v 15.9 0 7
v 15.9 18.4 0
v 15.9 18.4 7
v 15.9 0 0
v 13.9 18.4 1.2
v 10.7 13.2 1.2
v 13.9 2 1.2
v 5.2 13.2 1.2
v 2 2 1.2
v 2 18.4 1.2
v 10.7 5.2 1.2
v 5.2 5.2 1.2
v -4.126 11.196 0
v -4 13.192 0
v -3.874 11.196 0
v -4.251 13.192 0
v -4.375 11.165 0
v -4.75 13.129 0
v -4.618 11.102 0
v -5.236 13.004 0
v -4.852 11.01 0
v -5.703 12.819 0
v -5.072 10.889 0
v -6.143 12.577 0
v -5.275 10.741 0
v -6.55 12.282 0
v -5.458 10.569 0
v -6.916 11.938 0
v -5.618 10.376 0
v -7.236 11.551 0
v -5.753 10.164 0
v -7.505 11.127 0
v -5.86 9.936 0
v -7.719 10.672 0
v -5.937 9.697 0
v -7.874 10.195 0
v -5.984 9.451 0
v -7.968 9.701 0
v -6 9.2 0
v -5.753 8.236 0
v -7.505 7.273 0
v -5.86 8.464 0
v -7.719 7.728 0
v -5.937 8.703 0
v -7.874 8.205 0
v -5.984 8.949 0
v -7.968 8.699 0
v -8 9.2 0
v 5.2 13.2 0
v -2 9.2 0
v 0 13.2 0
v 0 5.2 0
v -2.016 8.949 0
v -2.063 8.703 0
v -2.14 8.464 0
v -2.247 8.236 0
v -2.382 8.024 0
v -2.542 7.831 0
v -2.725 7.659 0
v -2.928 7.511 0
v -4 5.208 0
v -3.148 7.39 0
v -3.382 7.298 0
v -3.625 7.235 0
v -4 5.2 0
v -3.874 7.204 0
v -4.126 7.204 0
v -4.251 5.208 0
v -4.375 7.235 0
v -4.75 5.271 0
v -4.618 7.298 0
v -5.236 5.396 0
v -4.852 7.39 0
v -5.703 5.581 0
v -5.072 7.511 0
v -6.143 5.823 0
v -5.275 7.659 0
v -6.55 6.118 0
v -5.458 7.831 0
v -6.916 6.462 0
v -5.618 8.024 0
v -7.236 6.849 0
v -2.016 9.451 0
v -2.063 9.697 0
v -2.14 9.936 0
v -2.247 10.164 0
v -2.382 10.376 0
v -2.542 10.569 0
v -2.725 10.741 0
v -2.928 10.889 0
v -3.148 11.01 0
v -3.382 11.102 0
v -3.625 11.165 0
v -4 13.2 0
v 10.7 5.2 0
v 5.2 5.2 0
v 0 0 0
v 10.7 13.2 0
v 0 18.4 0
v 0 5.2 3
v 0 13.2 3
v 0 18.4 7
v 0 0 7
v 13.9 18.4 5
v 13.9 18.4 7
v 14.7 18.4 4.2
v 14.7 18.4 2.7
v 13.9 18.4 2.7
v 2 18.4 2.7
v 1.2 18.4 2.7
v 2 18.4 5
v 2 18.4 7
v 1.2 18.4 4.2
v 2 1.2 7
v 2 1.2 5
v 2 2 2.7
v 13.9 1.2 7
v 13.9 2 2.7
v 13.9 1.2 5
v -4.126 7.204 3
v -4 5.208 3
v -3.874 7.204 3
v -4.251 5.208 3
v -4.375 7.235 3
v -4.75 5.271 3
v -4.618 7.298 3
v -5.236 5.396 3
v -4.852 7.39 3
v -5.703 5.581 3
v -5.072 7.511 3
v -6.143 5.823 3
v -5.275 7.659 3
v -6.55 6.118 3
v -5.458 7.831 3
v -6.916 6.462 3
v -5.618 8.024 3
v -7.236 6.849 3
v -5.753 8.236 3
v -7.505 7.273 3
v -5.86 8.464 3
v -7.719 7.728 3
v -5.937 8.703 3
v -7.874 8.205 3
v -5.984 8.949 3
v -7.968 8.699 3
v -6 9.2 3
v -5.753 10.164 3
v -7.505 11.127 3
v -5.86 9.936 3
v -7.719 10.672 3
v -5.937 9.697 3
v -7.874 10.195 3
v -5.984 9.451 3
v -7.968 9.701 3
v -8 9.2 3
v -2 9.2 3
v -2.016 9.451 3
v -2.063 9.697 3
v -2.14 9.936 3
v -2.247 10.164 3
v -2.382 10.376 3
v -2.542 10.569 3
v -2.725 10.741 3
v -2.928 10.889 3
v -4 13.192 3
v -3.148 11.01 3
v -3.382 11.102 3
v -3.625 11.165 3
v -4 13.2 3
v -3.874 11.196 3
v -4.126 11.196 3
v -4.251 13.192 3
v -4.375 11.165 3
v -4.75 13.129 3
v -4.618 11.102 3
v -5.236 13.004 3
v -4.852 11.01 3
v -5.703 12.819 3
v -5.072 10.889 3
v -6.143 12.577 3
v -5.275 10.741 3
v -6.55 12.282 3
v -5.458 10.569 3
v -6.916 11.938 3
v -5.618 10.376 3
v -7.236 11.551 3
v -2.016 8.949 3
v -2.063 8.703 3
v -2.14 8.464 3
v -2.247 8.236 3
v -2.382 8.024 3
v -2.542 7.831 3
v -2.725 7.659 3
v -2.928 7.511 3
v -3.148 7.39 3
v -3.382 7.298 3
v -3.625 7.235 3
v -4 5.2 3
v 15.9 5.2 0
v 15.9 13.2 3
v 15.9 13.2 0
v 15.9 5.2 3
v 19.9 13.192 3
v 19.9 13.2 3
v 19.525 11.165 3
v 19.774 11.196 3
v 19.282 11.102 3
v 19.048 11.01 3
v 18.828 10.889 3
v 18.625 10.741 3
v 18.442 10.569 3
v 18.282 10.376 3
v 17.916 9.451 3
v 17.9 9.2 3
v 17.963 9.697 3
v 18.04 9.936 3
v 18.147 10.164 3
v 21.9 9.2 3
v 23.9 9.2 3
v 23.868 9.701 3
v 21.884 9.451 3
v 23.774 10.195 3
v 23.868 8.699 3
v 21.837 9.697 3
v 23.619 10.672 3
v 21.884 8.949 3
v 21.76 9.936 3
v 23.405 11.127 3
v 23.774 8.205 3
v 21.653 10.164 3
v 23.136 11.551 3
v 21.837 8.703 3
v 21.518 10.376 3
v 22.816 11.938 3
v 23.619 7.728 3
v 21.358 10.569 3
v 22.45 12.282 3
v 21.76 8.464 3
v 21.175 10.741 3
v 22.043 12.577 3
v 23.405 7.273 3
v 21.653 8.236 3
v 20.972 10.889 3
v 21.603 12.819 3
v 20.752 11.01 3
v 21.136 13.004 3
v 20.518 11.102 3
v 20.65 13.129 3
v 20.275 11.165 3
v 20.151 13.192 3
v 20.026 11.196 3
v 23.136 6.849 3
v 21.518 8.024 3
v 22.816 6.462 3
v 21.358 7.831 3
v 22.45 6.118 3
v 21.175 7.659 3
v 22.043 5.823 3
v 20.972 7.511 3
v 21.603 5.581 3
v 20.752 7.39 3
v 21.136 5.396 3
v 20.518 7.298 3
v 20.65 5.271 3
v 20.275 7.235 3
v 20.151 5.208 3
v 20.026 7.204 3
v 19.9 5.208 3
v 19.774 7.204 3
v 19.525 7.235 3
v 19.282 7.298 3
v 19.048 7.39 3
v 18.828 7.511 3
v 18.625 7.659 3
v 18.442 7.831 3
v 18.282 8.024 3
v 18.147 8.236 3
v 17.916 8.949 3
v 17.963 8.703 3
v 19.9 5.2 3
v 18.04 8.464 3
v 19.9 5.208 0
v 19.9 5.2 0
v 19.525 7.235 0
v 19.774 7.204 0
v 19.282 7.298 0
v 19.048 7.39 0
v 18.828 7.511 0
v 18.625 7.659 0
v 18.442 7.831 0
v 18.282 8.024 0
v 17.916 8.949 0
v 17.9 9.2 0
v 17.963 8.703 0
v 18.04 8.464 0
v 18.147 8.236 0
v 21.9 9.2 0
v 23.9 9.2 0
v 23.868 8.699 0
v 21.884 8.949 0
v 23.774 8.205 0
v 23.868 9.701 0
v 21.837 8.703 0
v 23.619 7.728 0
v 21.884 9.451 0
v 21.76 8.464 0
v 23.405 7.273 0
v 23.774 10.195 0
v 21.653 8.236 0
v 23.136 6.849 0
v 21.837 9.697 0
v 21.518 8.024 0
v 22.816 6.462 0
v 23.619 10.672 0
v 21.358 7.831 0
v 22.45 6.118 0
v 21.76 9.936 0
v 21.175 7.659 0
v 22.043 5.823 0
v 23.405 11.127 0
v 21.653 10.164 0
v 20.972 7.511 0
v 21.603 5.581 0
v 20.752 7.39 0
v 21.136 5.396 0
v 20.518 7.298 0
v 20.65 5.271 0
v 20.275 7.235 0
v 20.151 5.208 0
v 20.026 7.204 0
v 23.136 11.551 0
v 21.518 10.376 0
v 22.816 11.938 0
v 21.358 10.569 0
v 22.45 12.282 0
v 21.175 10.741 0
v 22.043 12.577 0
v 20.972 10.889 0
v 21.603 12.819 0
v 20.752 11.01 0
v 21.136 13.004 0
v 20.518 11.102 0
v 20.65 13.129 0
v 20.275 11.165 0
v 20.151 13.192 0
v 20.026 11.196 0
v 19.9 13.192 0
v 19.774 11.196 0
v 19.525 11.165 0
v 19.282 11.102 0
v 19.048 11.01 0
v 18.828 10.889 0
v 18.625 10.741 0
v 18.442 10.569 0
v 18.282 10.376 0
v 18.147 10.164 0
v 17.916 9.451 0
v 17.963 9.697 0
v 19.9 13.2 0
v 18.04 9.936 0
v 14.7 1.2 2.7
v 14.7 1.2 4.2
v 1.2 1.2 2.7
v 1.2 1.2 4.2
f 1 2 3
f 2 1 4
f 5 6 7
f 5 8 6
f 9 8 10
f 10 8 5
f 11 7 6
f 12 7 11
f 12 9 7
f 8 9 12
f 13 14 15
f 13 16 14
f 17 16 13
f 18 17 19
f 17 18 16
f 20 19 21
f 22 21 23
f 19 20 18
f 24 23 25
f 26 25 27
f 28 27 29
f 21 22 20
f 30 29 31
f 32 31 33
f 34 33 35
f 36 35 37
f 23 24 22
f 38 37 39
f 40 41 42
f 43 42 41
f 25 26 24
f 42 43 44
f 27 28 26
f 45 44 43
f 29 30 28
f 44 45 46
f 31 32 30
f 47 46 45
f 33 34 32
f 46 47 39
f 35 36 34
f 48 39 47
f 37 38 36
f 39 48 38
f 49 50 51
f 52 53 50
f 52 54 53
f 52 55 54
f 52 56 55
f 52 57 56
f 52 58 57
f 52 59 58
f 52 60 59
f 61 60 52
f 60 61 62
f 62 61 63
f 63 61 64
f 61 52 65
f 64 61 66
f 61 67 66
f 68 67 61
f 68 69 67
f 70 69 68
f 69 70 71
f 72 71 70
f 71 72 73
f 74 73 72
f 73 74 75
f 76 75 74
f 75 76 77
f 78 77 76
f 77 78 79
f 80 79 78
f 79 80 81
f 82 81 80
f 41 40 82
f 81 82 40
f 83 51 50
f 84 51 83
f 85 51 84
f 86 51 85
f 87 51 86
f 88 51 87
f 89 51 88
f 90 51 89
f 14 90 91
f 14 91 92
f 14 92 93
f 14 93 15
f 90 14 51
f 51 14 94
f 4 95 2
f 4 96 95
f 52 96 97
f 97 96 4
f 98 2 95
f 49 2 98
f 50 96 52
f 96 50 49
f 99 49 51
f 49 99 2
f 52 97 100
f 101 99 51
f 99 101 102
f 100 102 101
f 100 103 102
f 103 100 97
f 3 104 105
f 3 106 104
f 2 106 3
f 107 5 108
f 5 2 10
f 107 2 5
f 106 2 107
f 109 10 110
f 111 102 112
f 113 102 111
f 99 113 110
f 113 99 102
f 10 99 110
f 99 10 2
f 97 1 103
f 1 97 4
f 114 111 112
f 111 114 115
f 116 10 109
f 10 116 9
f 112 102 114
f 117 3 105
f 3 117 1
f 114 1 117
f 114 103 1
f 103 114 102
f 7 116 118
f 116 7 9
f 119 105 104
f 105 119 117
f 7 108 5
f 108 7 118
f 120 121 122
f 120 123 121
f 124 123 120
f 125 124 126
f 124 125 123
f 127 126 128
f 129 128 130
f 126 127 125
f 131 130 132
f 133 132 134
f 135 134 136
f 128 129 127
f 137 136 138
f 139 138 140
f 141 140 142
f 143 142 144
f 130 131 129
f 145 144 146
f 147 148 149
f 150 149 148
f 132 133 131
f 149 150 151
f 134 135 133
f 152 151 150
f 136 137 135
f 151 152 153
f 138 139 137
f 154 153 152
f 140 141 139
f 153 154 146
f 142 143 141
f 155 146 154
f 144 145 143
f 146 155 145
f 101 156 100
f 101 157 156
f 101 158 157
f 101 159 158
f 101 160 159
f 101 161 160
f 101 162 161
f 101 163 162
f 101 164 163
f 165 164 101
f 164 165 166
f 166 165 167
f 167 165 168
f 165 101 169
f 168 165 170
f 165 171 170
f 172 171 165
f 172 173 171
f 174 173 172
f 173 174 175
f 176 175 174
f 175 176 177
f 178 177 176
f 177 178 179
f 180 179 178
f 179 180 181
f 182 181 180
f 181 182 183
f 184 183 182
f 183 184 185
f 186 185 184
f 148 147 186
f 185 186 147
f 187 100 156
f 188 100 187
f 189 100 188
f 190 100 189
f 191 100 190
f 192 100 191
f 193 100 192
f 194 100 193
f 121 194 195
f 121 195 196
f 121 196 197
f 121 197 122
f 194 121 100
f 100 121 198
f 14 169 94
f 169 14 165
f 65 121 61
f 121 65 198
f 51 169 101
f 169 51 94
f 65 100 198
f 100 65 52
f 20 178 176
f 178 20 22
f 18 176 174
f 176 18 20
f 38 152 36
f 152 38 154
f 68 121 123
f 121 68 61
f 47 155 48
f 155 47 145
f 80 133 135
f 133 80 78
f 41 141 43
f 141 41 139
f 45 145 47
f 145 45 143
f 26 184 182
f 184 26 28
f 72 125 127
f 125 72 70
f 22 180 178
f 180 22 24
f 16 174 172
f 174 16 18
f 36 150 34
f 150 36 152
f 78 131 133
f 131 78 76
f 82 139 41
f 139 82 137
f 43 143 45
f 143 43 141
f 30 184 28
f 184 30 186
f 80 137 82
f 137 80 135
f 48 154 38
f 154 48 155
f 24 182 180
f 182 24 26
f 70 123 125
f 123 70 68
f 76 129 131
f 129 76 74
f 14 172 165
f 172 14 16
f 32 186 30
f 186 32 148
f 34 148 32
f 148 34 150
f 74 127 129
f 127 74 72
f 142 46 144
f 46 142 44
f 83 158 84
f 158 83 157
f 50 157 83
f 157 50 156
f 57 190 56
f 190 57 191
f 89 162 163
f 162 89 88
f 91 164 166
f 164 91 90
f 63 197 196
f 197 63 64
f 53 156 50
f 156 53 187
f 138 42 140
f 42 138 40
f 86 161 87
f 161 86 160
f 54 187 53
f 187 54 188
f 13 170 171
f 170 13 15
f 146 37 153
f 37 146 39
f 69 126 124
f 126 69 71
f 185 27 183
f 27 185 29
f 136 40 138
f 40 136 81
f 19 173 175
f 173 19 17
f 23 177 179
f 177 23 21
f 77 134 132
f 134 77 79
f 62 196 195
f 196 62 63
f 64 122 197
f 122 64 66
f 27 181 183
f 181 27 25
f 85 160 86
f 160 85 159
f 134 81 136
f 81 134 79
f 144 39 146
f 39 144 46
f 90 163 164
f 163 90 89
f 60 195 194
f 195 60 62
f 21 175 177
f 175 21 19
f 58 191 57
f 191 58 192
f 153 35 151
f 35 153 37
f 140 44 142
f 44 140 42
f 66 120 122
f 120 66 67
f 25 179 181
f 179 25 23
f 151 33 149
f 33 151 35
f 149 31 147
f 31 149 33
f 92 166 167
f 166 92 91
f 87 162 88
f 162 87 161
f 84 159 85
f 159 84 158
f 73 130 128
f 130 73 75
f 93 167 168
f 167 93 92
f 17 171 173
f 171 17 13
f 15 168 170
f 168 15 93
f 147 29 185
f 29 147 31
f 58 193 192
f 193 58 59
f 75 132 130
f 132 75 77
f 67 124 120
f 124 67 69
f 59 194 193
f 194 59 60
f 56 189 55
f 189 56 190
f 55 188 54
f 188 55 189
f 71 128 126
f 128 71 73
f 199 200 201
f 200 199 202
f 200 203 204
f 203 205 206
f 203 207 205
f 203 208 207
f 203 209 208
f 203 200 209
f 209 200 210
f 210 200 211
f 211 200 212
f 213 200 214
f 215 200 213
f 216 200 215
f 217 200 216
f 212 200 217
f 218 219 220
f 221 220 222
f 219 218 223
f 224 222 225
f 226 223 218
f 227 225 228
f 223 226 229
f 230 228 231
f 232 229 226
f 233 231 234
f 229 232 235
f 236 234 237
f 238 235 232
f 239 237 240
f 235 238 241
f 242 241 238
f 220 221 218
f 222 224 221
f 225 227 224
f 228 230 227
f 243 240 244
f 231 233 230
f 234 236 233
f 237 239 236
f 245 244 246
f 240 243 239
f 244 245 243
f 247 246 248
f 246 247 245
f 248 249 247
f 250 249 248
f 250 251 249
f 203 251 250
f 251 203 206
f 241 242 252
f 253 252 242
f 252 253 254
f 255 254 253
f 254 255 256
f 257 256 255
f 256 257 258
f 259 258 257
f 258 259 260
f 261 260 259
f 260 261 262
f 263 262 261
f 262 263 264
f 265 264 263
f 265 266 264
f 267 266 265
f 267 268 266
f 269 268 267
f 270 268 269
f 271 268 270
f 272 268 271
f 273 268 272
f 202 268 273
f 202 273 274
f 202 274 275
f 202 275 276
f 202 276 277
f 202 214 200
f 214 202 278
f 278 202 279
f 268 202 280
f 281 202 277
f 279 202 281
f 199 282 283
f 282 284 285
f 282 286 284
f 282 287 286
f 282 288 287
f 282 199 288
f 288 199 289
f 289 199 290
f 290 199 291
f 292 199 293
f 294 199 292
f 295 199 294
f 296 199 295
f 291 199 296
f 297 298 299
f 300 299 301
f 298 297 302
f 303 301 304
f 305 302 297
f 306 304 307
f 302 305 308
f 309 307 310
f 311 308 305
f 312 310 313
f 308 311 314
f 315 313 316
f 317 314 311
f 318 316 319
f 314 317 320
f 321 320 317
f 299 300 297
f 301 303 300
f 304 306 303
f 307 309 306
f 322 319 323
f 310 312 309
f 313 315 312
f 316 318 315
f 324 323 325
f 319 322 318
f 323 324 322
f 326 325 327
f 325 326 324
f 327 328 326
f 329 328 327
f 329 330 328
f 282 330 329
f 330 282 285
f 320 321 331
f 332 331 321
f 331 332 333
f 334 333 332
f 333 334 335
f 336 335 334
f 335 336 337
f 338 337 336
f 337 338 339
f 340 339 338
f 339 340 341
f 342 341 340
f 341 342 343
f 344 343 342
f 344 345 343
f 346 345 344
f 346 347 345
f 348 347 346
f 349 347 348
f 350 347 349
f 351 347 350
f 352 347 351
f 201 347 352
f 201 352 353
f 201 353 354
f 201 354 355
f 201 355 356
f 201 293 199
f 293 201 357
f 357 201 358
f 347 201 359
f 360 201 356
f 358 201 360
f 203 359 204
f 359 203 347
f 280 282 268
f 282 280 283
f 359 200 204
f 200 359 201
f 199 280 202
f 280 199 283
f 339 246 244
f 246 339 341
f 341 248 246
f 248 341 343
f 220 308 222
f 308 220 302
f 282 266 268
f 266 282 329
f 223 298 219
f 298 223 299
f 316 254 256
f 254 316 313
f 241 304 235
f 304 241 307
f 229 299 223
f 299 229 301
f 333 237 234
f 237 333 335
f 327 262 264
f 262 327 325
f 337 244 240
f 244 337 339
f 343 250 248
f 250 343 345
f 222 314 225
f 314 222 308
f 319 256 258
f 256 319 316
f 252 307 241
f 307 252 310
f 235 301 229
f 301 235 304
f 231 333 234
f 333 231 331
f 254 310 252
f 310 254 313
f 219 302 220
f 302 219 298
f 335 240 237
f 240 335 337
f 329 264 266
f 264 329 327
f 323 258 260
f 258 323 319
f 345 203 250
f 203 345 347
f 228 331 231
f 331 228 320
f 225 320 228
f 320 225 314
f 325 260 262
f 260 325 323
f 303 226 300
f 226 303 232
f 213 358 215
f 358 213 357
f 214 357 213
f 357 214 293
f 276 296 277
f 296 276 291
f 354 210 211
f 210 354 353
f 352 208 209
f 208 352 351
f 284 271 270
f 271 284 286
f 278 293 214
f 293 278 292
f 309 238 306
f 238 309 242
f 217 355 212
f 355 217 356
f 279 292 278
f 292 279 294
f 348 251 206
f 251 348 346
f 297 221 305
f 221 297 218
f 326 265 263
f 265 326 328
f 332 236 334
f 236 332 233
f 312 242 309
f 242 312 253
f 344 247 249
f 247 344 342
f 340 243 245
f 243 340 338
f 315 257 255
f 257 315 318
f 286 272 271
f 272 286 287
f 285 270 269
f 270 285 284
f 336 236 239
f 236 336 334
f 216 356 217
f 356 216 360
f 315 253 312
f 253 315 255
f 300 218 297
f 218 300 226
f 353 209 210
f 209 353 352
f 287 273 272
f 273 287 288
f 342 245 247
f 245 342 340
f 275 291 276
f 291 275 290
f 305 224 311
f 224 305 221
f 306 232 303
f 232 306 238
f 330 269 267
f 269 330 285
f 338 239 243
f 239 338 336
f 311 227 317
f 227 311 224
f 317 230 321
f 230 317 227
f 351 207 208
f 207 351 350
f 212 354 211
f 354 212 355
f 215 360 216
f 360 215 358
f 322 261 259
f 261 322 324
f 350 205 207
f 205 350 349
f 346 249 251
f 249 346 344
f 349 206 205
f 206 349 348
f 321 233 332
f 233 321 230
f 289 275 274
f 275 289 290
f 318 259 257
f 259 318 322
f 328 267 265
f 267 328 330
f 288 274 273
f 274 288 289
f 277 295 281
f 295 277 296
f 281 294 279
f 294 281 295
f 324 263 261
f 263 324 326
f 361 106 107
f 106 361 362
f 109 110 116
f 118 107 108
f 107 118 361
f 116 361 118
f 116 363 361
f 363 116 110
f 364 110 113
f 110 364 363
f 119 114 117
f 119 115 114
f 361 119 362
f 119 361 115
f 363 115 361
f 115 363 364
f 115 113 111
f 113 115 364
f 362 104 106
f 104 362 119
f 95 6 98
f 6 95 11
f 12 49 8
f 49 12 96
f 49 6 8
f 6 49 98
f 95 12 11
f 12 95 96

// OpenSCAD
// file: ../lib/pcb_led_cvf.scad
// for led power module modified

/* bluetooth_mate_holder.scad
 * By John Biehler - November 17, 2011
 * http://www.thingiverse.com/thing:

 * derived from pcb_box_slide_with_tabs.scad
 * By Nicholas C Lewis - Jan 1, 2011
 * http://www.thingiverse.com/thing:5396
 *
 * derived from pcb_box_slide.scad
 *     Parametric, open PCB-box (slide-in) by chlunde
 *     http://www.thingiverse.com/thing:4071
 *
 * CHANGES
 * - adjusted to fit Arduino Mega
 * - added mounting tabs
 * - turned off cutouts
 * - adjusted bottom cutout size
 */

$fn=50;

module pcb_led_cvf(

	pcb_width = 48.2,
	pcb_length =24.1,
	pcb_height =1.1,
	slisse = 0.8,

	pcb_bottom_margin = 1,
	wall_width_thick = 2,
	box_height = 7,

	//tab parameters
	tab_hole_radius=2,
	tab_outer_radius=4,

	inner_margin = 4,

	add_tabs = true

) {
	wall_width = wall_width_thick-slisse;

module tab() {
	difference(){
		union() {
			translate([-tab_outer_radius,-tab_outer_radius,0])
			cube([tab_outer_radius,2*tab_outer_radius,wall_width_thick+1]);
			translate([-tab_outer_radius,0,0])
				cylinder(r=tab_outer_radius, h = wall_width_thick+1);
		}
		translate([-tab_outer_radius,0,0]) {
			cylinder(r= tab_hole_radius, h = wall_width_thick+5,center=true);
		}
	}

}

module box() {
	union() {
		cube([pcb_width + 2*wall_width, pcb_length + 2*wall_width, wall_width]);

		cube([wall_width_thick, pcb_length + 2*wall_width, box_height]);

		cube([pcb_width + 2*wall_width, wall_width_thick, box_height]);

		%translate([0, pcb_length+wall_width, 0])
			cube([pcb_width + 2*wall_width,wall_width,box_height]);

		translate([pcb_width + wall_width - slisse,0,0])
			cube([wall_width_thick, pcb_length + 2*wall_width, box_height]);
	}
	if(add_tabs) {
//comment out this part to remove tabs
		for(i=[(pcb_length + 2*wall_width)/2]){
	translate([0,i,0])tab();
	translate([pcb_width + 2*wall_width,i,0])mirror()tab();
		}
	}

}

module pcb() {
	translate([wall_width, wall_width, wall_width + pcb_bottom_margin])
		cube([pcb_width,pcb_length + wall_width + 0.1,pcb_height]);
	translate([wall_width, wall_width, wall_width + pcb_bottom_margin+pcb_height])rotate([0,45,0])
		cube([pcb_height,pcb_length + wall_width + 0.1,pcb_height]);
	translate([wall_width+pcb_width-2*cos(45)*pcb_height, wall_width, wall_width + pcb_bottom_margin+pcb_height])rotate([0,45,0])
		cube([pcb_height,pcb_length + wall_width + 0.1,pcb_height]);
	translate([wall_width_thick, wall_width, wall_width + pcb_bottom_margin])
		cube([pcb_width-2*slisse,pcb_length + wall_width + 0.1,box_height]);

}



module holes() {
		*translate([wall_width + pcb_width/2, wall_width_thick + 0.1, pcb_width/2+wall_width])
			rotate(a=90,v=[1,0,0])
				cylinder(r=pcb_width/2, h=wall_width_thick + 0.2);

		*translate([-0.1, wall_width + pcb_length/2, pcb_length/2 + wall_width])
			rotate(a=90,v=[0,1,0])
				cylinder(r=pcb_length/2, h=wall_width_thick + 0.2);

		*translate([pcb_width + wall_width - slisse - 0.1, wall_width + pcb_length/2, pcb_length/2 + wall_width])
			rotate(a=90,v=[0,1,0])
				cylinder(r=pcb_length/2, h=wall_width_thick + 0.2);

	 * translate([pcb_width/2 + wall_width, wall_width + pcb_length/2, -0.1])
			rotate(a=0,v=[0,1,0])
				cylinder(r=min(pcb_length,pcb_width)/2 - wall_width/2, h=wall_width_thick + 0.2);

		translate([inner_margin +wall_width, inner_margin+wall_width, -0.1])
			cube([pcb_width-inner_margin*2,pcb_length -inner_margin*2,wall_width + 0.2]);
}

	difference() {
		box();
		pcb();
		holes();
	}
}



pcb_led_cvf();
// main file
use <../lib/pcb_led_cvf.scad>


pcb_led_cvf(
  pcb_length=16,
  pcb_width=13.5,
  pcb_height=1.5,
  pcb_bottom_margin=1.5
);
